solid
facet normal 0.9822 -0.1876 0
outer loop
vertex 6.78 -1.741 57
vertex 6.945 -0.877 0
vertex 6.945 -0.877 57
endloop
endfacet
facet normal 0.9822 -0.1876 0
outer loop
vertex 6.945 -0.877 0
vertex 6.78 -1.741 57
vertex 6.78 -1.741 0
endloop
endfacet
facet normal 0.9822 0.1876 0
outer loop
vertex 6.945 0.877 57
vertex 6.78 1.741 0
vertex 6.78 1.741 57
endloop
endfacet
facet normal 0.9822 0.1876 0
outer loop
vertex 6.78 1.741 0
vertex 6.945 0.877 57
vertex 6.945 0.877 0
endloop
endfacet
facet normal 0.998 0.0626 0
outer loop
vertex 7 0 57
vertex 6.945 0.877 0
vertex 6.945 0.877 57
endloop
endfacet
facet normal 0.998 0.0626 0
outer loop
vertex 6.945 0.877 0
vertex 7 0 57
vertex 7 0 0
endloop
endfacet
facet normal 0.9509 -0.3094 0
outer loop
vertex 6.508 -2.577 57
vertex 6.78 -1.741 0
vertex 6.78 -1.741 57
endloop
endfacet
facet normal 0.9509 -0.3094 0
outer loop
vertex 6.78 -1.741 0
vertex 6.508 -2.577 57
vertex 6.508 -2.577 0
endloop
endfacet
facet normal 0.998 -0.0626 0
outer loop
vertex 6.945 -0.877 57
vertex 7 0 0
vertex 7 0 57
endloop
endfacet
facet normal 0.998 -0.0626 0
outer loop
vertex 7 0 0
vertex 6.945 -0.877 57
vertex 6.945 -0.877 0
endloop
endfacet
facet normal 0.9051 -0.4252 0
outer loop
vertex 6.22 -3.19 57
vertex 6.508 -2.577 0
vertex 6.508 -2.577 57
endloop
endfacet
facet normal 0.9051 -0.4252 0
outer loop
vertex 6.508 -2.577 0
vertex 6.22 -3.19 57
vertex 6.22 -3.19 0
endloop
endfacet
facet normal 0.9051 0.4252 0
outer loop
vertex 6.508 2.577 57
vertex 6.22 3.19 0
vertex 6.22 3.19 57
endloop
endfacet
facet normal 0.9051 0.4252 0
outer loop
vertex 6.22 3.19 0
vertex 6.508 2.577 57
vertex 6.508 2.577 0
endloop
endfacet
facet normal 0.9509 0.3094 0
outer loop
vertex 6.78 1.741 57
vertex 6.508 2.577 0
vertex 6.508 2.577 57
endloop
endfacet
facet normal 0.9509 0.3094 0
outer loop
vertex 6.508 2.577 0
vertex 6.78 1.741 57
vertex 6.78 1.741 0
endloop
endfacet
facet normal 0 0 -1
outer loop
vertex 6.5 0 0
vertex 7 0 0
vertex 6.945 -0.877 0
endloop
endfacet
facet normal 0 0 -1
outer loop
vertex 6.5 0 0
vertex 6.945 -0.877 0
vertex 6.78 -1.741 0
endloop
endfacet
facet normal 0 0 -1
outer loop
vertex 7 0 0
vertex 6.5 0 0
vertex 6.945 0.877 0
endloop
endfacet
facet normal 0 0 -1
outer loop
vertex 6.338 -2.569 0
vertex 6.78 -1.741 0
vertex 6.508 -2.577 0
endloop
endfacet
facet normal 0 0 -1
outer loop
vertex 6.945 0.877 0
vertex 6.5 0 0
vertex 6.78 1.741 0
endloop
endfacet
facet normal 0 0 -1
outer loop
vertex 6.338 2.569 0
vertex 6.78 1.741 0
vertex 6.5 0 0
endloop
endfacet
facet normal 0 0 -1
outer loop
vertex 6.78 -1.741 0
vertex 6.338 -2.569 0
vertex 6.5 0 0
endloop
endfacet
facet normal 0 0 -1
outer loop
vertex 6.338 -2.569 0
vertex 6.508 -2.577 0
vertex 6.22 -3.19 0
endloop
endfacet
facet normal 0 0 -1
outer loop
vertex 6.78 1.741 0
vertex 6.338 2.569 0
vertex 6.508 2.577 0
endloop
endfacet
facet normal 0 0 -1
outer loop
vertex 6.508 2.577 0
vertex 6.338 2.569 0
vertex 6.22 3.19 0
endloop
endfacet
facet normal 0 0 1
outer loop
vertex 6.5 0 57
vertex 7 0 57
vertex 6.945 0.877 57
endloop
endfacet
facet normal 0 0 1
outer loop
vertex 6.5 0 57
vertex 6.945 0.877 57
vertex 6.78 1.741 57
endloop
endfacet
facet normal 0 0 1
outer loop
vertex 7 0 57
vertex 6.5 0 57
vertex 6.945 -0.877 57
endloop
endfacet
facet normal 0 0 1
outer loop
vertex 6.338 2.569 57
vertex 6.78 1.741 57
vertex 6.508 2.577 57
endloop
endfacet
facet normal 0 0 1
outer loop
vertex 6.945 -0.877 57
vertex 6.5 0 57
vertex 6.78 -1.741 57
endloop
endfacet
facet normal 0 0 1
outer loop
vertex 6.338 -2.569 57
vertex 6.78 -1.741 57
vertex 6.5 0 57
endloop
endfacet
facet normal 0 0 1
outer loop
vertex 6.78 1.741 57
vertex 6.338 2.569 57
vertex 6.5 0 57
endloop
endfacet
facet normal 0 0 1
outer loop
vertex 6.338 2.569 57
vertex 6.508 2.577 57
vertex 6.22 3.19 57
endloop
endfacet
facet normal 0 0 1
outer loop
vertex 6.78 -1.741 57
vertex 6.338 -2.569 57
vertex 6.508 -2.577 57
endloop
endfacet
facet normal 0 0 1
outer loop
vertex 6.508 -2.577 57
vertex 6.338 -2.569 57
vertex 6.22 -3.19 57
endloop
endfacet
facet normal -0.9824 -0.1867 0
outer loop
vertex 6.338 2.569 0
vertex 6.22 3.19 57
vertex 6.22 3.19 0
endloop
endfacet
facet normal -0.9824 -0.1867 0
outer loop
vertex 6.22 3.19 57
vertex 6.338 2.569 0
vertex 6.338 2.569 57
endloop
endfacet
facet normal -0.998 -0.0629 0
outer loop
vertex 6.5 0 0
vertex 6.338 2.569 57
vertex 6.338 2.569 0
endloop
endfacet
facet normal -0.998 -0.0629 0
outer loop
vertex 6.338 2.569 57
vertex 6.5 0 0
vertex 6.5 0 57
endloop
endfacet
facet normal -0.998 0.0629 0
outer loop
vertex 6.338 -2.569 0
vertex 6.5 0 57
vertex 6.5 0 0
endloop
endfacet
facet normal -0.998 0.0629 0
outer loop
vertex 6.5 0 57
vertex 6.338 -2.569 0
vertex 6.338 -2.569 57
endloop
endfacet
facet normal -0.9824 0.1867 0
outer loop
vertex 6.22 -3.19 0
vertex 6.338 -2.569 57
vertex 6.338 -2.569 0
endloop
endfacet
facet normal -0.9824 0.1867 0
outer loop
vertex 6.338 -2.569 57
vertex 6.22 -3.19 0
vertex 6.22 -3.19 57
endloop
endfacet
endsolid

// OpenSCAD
$fn = 50;


difference() {
	union() {
		cylinder(h = 57, r = 7.0000000000);
		translate(v = [-17.0000000000, 0, 0]) {
			cylinder(h = 57, r = 7.0000000000);
		}
	}
	union() {
		cylinder(h = 57, r = 3.2500000000);
		cylinder(h = 57, r = 1.8000000000);
		cylinder(h = 57, r = 1.8000000000);
		cylinder(h = 57, r = 1.8000000000);
		translate(v = [-21.5000000000, 0, 0]) {
			hull() {
				translate(v = [-3.7500000000, 0.0000000000, 0]) {
					cylinder(h = 57, r = 10.5000000000);
				}
				translate(v = [3.7500000000, 0.0000000000, 0]) {
					cylinder(h = 57, r = 10.5000000000);
				}
				translate(v = [-3.7500000000, -0.0000000000, 0]) {
					cylinder(h = 57, r = 10.5000000000);
				}
				translate(v = [3.7500000000, -0.0000000000, 0]) {
					cylinder(h = 57, r = 10.5000000000);
				}
			}
		}
		translate(v = [-14.0000000000, 0, 0.0000000000]) {
			cylinder(h = 57, r = 20.5000000000);
		}
	}
}
